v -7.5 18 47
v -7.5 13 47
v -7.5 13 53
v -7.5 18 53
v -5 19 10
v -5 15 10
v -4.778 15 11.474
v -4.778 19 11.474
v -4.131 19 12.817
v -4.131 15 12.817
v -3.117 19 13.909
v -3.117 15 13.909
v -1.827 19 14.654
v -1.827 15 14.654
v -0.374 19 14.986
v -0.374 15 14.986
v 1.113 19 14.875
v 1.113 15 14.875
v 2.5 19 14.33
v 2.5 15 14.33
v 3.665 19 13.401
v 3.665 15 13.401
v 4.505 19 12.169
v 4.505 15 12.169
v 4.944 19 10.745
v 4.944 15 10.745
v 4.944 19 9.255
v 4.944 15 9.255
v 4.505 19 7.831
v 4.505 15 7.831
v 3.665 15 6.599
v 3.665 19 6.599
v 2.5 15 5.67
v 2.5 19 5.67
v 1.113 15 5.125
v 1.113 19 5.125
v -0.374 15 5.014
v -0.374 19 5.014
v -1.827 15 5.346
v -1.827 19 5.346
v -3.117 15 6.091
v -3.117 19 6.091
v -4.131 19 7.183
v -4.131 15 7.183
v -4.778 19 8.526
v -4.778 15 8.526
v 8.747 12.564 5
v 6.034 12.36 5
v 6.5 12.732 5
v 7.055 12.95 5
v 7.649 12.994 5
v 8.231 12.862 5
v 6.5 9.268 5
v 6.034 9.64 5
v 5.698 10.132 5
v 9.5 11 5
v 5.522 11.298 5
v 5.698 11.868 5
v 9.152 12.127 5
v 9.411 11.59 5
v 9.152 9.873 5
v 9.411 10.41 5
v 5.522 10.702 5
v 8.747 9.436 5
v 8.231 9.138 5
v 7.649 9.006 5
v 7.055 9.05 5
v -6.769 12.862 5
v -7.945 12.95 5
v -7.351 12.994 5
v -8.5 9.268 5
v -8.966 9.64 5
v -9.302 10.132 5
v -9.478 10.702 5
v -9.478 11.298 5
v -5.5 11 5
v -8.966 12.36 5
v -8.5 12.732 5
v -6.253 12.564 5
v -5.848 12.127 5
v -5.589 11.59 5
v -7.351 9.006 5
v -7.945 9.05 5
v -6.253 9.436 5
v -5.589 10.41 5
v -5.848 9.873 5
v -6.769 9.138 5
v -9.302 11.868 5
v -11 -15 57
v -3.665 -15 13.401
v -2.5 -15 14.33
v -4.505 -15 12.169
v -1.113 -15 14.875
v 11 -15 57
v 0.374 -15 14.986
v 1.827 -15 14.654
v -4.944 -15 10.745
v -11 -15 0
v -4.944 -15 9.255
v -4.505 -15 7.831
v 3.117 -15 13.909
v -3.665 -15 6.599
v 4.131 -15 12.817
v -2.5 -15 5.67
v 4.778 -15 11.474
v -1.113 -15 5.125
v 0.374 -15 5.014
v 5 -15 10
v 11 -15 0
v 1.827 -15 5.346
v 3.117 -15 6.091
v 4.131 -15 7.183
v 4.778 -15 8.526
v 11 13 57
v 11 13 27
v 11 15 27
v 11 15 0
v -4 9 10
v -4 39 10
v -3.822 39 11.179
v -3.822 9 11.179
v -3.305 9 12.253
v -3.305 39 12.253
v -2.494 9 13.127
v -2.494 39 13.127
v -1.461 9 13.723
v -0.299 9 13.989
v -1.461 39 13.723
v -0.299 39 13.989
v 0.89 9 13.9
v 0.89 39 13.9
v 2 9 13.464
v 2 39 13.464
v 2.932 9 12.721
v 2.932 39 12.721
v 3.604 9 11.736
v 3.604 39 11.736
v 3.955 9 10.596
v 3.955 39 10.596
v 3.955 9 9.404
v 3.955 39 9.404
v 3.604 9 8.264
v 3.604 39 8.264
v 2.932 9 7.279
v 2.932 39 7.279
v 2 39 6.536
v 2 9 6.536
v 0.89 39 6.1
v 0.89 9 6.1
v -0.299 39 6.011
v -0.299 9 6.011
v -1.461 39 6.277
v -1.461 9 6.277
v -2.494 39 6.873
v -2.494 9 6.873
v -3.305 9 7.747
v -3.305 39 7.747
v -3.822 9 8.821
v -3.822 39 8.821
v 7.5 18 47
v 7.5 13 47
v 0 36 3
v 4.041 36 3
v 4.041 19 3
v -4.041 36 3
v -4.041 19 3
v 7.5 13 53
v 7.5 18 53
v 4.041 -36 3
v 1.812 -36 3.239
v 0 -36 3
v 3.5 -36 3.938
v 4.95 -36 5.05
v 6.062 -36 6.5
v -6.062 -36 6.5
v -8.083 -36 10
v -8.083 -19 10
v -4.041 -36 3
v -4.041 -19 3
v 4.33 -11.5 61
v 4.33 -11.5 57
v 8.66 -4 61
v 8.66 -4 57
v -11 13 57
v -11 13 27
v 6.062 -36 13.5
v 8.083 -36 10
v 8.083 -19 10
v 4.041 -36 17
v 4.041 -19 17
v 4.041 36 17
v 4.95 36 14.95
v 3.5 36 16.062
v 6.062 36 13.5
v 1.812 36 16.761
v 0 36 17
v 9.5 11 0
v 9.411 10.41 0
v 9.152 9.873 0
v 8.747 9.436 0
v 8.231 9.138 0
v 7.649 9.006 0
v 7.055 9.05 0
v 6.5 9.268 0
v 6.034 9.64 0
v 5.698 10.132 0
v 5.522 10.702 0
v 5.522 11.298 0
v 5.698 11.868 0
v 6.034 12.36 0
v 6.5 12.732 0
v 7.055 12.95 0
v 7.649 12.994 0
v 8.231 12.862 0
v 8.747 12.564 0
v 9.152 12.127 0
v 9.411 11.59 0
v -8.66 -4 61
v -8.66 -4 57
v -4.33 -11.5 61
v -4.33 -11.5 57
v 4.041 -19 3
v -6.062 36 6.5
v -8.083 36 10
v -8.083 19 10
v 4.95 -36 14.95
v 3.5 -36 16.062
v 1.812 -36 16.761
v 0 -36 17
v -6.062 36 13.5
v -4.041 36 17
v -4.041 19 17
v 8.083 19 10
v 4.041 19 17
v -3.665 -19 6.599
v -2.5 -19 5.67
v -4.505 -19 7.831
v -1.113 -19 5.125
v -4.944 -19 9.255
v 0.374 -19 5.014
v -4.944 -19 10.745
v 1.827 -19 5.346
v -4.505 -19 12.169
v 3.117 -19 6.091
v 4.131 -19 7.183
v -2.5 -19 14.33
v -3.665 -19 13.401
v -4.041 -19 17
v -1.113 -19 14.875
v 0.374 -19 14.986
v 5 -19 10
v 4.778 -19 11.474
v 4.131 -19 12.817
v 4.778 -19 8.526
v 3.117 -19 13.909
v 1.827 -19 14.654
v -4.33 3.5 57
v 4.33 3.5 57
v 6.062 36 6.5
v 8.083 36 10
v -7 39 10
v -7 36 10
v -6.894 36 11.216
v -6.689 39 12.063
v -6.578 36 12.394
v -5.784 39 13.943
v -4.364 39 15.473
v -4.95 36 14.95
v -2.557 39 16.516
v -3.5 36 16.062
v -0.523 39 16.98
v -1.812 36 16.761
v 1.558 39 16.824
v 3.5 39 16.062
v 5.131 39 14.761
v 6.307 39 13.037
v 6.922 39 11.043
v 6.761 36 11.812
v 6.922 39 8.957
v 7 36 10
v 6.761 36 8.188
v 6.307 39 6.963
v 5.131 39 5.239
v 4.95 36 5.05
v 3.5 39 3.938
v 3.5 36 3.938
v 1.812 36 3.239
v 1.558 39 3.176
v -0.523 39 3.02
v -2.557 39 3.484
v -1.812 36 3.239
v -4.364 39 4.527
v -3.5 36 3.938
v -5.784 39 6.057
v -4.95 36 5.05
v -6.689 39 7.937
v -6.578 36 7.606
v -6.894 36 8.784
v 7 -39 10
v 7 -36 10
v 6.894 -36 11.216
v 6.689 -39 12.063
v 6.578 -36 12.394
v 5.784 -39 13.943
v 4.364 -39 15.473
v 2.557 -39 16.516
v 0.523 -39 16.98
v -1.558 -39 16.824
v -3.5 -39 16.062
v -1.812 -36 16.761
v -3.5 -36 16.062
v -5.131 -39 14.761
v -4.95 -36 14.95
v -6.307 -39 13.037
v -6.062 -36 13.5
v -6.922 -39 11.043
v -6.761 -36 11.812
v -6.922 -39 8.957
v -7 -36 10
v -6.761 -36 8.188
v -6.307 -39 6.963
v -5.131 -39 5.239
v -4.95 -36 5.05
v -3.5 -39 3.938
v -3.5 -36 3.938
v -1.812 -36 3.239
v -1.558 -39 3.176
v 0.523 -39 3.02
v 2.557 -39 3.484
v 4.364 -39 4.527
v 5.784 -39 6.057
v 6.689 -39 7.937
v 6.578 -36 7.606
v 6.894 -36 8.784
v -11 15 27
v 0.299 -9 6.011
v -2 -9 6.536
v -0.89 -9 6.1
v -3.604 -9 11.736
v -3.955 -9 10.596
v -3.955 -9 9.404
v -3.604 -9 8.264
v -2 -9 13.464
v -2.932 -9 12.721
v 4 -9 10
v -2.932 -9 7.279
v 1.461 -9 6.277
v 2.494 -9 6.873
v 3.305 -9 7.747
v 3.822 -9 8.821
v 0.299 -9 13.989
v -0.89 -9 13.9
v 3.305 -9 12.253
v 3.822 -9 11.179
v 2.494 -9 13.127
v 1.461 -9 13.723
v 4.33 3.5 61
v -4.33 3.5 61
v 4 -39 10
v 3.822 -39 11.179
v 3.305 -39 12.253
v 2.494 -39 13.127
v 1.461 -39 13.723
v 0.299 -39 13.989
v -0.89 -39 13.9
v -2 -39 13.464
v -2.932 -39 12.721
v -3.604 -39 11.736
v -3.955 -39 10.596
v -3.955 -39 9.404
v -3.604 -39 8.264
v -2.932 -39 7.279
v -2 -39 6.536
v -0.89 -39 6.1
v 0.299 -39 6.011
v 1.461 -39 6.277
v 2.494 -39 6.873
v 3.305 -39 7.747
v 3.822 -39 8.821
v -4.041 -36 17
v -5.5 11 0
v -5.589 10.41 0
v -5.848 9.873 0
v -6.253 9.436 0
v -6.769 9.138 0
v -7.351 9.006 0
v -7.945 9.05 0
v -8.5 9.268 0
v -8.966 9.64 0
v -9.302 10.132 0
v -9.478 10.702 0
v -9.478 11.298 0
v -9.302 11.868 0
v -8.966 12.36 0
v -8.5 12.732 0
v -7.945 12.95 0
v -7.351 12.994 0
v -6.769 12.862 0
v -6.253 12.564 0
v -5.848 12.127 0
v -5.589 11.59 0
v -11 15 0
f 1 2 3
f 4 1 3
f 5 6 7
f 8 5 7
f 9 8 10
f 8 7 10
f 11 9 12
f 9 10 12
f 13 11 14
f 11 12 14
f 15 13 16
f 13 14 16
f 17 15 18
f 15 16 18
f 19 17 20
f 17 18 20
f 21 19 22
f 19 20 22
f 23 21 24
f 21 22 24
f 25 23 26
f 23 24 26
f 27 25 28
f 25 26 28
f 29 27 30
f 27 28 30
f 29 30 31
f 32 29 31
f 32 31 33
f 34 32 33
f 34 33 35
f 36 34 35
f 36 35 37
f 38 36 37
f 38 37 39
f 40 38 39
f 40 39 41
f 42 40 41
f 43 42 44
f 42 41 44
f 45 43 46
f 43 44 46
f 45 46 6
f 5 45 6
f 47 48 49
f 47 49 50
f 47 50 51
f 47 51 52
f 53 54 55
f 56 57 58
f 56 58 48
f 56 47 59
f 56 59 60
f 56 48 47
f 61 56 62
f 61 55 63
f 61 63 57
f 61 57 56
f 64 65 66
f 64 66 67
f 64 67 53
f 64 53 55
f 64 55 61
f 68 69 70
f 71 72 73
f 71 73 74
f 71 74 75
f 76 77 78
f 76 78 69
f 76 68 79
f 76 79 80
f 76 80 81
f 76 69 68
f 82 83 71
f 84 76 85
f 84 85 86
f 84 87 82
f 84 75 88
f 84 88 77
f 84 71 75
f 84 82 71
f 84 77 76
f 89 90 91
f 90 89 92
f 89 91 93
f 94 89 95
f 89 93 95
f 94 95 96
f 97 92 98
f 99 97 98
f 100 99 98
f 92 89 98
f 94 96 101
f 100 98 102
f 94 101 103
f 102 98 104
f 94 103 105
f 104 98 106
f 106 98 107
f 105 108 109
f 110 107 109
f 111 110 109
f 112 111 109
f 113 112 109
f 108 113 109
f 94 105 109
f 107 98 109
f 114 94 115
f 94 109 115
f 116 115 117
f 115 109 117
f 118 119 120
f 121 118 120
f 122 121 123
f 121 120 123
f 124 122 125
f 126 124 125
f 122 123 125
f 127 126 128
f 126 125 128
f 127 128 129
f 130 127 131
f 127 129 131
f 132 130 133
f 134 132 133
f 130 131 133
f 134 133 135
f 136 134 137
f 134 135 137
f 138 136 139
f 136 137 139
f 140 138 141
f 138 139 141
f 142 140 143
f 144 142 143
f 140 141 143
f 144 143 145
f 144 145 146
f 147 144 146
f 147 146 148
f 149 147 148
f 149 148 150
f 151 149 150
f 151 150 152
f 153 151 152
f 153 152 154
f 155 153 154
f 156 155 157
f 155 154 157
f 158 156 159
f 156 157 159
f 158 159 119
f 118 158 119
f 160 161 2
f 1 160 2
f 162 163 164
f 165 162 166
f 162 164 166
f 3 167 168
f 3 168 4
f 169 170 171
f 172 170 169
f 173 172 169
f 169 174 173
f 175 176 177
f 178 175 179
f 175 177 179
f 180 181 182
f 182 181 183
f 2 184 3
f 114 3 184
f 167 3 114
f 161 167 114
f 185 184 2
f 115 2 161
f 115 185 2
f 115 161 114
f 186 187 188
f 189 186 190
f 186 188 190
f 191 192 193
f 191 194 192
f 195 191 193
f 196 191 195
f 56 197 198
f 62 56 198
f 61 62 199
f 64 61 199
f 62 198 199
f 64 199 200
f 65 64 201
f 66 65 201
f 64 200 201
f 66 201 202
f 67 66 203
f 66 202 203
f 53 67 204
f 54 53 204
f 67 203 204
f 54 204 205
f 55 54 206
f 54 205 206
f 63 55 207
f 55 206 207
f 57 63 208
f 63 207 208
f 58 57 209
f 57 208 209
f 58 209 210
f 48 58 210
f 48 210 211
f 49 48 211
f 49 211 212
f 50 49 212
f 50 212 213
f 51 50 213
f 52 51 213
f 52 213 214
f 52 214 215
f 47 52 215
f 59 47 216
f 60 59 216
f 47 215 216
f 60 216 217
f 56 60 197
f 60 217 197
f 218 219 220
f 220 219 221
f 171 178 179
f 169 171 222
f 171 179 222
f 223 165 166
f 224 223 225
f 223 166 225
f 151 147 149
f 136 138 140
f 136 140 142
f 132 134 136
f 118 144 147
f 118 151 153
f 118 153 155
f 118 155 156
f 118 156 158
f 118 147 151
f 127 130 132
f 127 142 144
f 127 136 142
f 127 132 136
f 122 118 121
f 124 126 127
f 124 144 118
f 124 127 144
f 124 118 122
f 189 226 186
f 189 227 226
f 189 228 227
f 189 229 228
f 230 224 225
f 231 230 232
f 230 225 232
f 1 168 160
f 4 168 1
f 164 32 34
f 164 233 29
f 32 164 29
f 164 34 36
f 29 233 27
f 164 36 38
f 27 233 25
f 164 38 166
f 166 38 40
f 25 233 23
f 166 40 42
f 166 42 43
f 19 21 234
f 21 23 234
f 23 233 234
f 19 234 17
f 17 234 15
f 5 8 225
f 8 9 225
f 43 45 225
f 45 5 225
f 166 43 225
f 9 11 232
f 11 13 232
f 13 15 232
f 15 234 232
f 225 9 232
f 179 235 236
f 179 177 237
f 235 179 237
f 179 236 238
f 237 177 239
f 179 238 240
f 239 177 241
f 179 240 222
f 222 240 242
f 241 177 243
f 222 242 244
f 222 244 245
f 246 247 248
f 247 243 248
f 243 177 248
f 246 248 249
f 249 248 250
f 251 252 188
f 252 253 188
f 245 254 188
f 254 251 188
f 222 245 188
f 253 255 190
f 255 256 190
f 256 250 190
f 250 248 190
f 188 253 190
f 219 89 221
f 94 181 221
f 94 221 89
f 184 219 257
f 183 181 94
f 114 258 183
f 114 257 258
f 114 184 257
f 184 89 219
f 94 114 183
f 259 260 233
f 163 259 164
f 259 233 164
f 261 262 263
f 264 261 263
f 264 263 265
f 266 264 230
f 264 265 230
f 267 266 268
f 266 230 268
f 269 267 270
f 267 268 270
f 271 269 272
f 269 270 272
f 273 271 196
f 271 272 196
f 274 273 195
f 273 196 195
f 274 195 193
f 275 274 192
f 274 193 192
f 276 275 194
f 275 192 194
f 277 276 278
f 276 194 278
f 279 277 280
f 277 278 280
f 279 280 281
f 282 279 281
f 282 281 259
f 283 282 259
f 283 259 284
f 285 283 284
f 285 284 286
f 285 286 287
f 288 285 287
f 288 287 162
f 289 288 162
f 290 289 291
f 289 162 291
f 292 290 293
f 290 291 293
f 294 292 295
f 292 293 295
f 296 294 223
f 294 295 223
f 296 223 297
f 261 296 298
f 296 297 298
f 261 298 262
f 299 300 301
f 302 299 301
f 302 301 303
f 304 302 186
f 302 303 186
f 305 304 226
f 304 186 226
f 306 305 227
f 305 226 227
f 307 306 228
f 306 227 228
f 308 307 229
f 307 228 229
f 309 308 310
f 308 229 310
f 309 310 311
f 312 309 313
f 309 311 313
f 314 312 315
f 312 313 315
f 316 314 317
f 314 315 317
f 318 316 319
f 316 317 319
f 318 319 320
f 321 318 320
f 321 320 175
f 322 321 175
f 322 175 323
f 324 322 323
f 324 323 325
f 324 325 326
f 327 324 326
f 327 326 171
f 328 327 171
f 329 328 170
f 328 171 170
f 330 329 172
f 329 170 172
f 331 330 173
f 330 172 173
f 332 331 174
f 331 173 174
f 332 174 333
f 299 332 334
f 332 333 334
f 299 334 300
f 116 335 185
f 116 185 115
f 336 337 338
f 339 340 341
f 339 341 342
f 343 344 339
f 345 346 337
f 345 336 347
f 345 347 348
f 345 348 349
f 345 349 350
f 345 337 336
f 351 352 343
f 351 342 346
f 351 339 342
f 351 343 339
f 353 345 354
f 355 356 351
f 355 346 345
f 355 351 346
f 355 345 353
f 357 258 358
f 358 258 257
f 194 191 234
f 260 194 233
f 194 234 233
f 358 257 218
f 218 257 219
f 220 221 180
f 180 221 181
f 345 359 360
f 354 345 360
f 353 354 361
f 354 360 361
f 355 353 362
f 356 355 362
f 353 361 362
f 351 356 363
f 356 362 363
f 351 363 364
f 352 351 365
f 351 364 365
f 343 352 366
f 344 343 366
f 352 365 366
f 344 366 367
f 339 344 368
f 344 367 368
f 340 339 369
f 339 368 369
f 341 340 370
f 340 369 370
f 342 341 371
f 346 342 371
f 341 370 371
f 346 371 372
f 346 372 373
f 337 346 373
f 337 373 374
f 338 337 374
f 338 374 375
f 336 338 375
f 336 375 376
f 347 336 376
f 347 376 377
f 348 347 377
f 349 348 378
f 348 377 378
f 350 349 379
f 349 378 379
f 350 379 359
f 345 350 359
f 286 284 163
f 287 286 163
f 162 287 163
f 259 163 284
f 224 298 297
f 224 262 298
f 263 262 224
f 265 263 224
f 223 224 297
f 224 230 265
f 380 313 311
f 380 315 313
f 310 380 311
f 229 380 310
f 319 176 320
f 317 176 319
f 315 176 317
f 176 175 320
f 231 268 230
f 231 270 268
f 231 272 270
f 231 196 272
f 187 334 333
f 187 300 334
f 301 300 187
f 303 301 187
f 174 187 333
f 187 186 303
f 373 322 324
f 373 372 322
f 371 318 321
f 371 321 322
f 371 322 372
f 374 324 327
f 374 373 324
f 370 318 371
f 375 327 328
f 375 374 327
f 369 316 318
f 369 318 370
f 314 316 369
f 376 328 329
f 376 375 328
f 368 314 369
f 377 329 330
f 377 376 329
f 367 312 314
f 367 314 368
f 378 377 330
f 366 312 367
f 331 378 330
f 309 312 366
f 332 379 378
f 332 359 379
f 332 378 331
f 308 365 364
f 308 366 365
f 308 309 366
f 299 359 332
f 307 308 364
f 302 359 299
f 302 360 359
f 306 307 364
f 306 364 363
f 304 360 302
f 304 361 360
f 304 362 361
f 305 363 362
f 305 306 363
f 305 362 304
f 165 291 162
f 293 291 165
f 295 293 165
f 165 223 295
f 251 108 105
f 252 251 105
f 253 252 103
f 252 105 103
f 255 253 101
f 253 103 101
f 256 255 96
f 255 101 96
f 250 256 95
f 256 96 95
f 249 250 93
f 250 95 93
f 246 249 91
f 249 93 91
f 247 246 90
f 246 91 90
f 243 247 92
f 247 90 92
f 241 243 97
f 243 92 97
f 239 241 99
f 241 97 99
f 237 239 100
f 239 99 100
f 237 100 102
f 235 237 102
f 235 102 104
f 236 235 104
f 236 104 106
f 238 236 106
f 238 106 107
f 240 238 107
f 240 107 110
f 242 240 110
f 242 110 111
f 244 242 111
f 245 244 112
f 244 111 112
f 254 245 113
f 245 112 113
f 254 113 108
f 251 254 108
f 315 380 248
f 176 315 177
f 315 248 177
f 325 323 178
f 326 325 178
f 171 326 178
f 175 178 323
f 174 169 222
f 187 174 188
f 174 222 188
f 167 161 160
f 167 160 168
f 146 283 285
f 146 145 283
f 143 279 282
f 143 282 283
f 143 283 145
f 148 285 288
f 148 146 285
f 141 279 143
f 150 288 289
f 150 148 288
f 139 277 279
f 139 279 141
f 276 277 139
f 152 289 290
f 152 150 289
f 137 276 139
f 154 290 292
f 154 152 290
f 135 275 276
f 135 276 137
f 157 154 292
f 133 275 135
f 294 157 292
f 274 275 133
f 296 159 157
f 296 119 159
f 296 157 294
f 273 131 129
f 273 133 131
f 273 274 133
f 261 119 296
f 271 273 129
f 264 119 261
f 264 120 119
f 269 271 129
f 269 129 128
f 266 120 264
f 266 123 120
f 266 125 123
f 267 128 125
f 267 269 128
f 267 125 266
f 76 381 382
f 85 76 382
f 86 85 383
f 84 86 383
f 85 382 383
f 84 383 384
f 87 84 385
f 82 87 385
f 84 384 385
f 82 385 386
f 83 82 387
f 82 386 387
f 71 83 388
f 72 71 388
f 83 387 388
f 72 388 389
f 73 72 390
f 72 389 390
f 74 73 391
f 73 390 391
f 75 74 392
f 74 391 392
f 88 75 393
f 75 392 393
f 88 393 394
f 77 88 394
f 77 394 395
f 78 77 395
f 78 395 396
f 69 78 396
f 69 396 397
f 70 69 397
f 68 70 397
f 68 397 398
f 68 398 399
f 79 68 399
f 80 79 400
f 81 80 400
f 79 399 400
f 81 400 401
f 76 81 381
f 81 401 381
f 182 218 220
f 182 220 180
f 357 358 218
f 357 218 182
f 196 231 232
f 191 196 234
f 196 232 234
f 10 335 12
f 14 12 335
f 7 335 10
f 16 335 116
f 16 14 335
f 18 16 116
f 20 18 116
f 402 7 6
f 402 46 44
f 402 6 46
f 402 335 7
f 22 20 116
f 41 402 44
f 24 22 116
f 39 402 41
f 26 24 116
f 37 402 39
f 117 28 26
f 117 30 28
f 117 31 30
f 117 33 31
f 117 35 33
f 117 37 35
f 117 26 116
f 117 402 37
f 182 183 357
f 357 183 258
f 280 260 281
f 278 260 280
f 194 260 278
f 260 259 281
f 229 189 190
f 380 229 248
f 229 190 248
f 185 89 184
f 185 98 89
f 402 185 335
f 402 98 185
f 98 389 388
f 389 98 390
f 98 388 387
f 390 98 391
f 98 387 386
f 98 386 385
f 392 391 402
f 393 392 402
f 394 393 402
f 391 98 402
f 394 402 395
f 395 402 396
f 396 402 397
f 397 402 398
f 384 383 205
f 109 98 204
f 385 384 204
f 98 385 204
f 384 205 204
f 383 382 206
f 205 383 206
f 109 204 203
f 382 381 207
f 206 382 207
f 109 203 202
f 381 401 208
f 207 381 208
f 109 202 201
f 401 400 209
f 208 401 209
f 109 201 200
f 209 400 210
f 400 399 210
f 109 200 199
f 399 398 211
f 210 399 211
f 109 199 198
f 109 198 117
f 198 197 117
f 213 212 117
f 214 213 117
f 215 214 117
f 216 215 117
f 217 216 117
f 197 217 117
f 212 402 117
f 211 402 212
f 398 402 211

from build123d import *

# Parameters (mm, degrees)
SKETCH_W        = 22
SKETCH_H        = 30
PAD_DEPTH       = 27
SKETCH001_W     = 22
SKETCH001_H     = 28
PAD001_DEPTH    = 30
PAD002_DEPTH    = 4
SKETCH003_R     = 5
PAD003_DEPTH    = 4
PAD004_DEPTH    = 17
SKETCH005_R     = 7
PAD005_DEPTH    = 3
SKETCH006_R     = 4
POCKET_DEPTH    = 30
SKETCH007_W     = 15
SKETCH007_H     = 6
PAD006_DEPTH    = 5
SKETCH008_R     = 5
PAD007_DEPTH    = 4
PAD008_DEPTH    = 17
SKETCH010_R     = 7
PAD009_DEPTH    = 3
SKETCH011_R     = 4
POCKET001_DEPTH = 30
SKETCH012_R     = 2
POCKET002_DEPTH = 5


with BuildPart() as part:
    # Sketch → Pad (new body)
    with BuildSketch(Plane.XY):
        Rectangle(SKETCH_W, SKETCH_H)
    extrude(amount=PAD_DEPTH)

    # Sketch001 (on Face6 of Pad) → Pad001 (join)
    with BuildSketch(Plane.XY.offset(27)):
        with Locations((0, -1)):
            Rectangle(SKETCH001_W, SKETCH001_H)
    extrude(amount=PAD001_DEPTH)

    # Sketch002 (on Face11 of Pad001) → Pad002 (join)
    with BuildSketch(Plane.XY.offset(57)):
        Polygon((8.660254, -4), (4.330127, 3.5), (-4.330127, 3.5), (-8.660254, -4), (-4.330127, -11.5), (4.330127, -11.5), align=None)
    extrude(amount=PAD002_DEPTH)

    # Sketch003 (on Face6 of Pad002) → Pad003 (join)
    with BuildSketch(Plane.XZ.offset(15)):
        with Locations((0, 10)):
            Circle(SKETCH003_R)
    extrude(amount=PAD003_DEPTH)

    # Sketch004 (on Face13 of Pad003) → Pad004 (join)
    with BuildSketch(Plane.XZ.offset(19)):
        Polygon((8.082904, 10), (4.041452, 17), (-4.041452, 17), (-8.082904, 10), (-4.041452, 3), (4.041452, 3), align=None)
    extrude(amount=PAD004_DEPTH)

    # Sketch005 (on Face5 of Pad004) → Pad005 (join)
    with BuildSketch(Plane.XZ.offset(36)):
        with Locations((0, 10)):
            Circle(SKETCH005_R)
    extrude(amount=PAD005_DEPTH)

    # Sketch006 (on Face17 of Pad005) → Pocket (cut)
    with BuildSketch(Plane.XZ.offset(39)):
        with Locations((0, 10)):
            Circle(SKETCH006_R)
    extrude(amount=-POCKET_DEPTH, mode=Mode.SUBTRACT)

    # Sketch007 (on Face29 of Pocket) → Pad006 (join)
    with BuildSketch(Plane(origin=(0, 13, 0), x_dir=(-1, 0, 0), z_dir=(0, 1, 0))):
        with Locations((0, 50)):
            Rectangle(SKETCH007_W, SKETCH007_H)
    extrude(amount=PAD006_DEPTH)

    # Sketch008 (on Face23 of Pad006) → Pad007 (join)
    with BuildSketch(Plane(origin=(0, 15, 0), x_dir=(-1, 0, 0), z_dir=(0, 1, 0))):
        with Locations((0, 10)):
            Circle(SKETCH008_R)
    extrude(amount=PAD007_DEPTH)

    # Sketch009 (on Face37 of Pad007) → Pad008 (join)
    with BuildSketch(Plane(origin=(0, 19, 0), x_dir=(-1, 0, 0), z_dir=(0, 1, 0))):
        Polygon((4.041452, 3), (8.082904, 10), (4.041452, 17), (-4.041452, 17), (-8.082904, 10), (-4.041452, 3), align=None)
    extrude(amount=PAD008_DEPTH)

    # Sketch010 (on Face5 of Pad008) → Pad009 (join)
    with BuildSketch(Plane(origin=(0, 36, 0), x_dir=(-1, 0, 0), z_dir=(0, 1, 0))):
        with Locations((0, 10)):
            Circle(SKETCH010_R)
    extrude(amount=PAD009_DEPTH)

    # Sketch011 (on Face17 of Pad009) → Pocket001 (cut)
    with BuildSketch(Plane(origin=(0, 39, 0), x_dir=(-1, 0, 0), z_dir=(0, 1, 0))):
        with Locations((0, 10)):
            Circle(SKETCH011_R)
    extrude(amount=-POCKET001_DEPTH, mode=Mode.SUBTRACT)

    # Sketch012 (on Face19 of Pocket001) → Pocket002 (cut)
    with BuildSketch(Plane(origin=(0, 0, 0), x_dir=(1, 0, 0), z_dir=(0, 0, -1))):
        with Locations((-7.5, -11)):
            Circle(SKETCH012_R)
        with Locations((7.5, -11)):
            Circle(SKETCH012_R)
    extrude(amount=-POCKET002_DEPTH, mode=Mode.SUBTRACT)


solid = part.part
